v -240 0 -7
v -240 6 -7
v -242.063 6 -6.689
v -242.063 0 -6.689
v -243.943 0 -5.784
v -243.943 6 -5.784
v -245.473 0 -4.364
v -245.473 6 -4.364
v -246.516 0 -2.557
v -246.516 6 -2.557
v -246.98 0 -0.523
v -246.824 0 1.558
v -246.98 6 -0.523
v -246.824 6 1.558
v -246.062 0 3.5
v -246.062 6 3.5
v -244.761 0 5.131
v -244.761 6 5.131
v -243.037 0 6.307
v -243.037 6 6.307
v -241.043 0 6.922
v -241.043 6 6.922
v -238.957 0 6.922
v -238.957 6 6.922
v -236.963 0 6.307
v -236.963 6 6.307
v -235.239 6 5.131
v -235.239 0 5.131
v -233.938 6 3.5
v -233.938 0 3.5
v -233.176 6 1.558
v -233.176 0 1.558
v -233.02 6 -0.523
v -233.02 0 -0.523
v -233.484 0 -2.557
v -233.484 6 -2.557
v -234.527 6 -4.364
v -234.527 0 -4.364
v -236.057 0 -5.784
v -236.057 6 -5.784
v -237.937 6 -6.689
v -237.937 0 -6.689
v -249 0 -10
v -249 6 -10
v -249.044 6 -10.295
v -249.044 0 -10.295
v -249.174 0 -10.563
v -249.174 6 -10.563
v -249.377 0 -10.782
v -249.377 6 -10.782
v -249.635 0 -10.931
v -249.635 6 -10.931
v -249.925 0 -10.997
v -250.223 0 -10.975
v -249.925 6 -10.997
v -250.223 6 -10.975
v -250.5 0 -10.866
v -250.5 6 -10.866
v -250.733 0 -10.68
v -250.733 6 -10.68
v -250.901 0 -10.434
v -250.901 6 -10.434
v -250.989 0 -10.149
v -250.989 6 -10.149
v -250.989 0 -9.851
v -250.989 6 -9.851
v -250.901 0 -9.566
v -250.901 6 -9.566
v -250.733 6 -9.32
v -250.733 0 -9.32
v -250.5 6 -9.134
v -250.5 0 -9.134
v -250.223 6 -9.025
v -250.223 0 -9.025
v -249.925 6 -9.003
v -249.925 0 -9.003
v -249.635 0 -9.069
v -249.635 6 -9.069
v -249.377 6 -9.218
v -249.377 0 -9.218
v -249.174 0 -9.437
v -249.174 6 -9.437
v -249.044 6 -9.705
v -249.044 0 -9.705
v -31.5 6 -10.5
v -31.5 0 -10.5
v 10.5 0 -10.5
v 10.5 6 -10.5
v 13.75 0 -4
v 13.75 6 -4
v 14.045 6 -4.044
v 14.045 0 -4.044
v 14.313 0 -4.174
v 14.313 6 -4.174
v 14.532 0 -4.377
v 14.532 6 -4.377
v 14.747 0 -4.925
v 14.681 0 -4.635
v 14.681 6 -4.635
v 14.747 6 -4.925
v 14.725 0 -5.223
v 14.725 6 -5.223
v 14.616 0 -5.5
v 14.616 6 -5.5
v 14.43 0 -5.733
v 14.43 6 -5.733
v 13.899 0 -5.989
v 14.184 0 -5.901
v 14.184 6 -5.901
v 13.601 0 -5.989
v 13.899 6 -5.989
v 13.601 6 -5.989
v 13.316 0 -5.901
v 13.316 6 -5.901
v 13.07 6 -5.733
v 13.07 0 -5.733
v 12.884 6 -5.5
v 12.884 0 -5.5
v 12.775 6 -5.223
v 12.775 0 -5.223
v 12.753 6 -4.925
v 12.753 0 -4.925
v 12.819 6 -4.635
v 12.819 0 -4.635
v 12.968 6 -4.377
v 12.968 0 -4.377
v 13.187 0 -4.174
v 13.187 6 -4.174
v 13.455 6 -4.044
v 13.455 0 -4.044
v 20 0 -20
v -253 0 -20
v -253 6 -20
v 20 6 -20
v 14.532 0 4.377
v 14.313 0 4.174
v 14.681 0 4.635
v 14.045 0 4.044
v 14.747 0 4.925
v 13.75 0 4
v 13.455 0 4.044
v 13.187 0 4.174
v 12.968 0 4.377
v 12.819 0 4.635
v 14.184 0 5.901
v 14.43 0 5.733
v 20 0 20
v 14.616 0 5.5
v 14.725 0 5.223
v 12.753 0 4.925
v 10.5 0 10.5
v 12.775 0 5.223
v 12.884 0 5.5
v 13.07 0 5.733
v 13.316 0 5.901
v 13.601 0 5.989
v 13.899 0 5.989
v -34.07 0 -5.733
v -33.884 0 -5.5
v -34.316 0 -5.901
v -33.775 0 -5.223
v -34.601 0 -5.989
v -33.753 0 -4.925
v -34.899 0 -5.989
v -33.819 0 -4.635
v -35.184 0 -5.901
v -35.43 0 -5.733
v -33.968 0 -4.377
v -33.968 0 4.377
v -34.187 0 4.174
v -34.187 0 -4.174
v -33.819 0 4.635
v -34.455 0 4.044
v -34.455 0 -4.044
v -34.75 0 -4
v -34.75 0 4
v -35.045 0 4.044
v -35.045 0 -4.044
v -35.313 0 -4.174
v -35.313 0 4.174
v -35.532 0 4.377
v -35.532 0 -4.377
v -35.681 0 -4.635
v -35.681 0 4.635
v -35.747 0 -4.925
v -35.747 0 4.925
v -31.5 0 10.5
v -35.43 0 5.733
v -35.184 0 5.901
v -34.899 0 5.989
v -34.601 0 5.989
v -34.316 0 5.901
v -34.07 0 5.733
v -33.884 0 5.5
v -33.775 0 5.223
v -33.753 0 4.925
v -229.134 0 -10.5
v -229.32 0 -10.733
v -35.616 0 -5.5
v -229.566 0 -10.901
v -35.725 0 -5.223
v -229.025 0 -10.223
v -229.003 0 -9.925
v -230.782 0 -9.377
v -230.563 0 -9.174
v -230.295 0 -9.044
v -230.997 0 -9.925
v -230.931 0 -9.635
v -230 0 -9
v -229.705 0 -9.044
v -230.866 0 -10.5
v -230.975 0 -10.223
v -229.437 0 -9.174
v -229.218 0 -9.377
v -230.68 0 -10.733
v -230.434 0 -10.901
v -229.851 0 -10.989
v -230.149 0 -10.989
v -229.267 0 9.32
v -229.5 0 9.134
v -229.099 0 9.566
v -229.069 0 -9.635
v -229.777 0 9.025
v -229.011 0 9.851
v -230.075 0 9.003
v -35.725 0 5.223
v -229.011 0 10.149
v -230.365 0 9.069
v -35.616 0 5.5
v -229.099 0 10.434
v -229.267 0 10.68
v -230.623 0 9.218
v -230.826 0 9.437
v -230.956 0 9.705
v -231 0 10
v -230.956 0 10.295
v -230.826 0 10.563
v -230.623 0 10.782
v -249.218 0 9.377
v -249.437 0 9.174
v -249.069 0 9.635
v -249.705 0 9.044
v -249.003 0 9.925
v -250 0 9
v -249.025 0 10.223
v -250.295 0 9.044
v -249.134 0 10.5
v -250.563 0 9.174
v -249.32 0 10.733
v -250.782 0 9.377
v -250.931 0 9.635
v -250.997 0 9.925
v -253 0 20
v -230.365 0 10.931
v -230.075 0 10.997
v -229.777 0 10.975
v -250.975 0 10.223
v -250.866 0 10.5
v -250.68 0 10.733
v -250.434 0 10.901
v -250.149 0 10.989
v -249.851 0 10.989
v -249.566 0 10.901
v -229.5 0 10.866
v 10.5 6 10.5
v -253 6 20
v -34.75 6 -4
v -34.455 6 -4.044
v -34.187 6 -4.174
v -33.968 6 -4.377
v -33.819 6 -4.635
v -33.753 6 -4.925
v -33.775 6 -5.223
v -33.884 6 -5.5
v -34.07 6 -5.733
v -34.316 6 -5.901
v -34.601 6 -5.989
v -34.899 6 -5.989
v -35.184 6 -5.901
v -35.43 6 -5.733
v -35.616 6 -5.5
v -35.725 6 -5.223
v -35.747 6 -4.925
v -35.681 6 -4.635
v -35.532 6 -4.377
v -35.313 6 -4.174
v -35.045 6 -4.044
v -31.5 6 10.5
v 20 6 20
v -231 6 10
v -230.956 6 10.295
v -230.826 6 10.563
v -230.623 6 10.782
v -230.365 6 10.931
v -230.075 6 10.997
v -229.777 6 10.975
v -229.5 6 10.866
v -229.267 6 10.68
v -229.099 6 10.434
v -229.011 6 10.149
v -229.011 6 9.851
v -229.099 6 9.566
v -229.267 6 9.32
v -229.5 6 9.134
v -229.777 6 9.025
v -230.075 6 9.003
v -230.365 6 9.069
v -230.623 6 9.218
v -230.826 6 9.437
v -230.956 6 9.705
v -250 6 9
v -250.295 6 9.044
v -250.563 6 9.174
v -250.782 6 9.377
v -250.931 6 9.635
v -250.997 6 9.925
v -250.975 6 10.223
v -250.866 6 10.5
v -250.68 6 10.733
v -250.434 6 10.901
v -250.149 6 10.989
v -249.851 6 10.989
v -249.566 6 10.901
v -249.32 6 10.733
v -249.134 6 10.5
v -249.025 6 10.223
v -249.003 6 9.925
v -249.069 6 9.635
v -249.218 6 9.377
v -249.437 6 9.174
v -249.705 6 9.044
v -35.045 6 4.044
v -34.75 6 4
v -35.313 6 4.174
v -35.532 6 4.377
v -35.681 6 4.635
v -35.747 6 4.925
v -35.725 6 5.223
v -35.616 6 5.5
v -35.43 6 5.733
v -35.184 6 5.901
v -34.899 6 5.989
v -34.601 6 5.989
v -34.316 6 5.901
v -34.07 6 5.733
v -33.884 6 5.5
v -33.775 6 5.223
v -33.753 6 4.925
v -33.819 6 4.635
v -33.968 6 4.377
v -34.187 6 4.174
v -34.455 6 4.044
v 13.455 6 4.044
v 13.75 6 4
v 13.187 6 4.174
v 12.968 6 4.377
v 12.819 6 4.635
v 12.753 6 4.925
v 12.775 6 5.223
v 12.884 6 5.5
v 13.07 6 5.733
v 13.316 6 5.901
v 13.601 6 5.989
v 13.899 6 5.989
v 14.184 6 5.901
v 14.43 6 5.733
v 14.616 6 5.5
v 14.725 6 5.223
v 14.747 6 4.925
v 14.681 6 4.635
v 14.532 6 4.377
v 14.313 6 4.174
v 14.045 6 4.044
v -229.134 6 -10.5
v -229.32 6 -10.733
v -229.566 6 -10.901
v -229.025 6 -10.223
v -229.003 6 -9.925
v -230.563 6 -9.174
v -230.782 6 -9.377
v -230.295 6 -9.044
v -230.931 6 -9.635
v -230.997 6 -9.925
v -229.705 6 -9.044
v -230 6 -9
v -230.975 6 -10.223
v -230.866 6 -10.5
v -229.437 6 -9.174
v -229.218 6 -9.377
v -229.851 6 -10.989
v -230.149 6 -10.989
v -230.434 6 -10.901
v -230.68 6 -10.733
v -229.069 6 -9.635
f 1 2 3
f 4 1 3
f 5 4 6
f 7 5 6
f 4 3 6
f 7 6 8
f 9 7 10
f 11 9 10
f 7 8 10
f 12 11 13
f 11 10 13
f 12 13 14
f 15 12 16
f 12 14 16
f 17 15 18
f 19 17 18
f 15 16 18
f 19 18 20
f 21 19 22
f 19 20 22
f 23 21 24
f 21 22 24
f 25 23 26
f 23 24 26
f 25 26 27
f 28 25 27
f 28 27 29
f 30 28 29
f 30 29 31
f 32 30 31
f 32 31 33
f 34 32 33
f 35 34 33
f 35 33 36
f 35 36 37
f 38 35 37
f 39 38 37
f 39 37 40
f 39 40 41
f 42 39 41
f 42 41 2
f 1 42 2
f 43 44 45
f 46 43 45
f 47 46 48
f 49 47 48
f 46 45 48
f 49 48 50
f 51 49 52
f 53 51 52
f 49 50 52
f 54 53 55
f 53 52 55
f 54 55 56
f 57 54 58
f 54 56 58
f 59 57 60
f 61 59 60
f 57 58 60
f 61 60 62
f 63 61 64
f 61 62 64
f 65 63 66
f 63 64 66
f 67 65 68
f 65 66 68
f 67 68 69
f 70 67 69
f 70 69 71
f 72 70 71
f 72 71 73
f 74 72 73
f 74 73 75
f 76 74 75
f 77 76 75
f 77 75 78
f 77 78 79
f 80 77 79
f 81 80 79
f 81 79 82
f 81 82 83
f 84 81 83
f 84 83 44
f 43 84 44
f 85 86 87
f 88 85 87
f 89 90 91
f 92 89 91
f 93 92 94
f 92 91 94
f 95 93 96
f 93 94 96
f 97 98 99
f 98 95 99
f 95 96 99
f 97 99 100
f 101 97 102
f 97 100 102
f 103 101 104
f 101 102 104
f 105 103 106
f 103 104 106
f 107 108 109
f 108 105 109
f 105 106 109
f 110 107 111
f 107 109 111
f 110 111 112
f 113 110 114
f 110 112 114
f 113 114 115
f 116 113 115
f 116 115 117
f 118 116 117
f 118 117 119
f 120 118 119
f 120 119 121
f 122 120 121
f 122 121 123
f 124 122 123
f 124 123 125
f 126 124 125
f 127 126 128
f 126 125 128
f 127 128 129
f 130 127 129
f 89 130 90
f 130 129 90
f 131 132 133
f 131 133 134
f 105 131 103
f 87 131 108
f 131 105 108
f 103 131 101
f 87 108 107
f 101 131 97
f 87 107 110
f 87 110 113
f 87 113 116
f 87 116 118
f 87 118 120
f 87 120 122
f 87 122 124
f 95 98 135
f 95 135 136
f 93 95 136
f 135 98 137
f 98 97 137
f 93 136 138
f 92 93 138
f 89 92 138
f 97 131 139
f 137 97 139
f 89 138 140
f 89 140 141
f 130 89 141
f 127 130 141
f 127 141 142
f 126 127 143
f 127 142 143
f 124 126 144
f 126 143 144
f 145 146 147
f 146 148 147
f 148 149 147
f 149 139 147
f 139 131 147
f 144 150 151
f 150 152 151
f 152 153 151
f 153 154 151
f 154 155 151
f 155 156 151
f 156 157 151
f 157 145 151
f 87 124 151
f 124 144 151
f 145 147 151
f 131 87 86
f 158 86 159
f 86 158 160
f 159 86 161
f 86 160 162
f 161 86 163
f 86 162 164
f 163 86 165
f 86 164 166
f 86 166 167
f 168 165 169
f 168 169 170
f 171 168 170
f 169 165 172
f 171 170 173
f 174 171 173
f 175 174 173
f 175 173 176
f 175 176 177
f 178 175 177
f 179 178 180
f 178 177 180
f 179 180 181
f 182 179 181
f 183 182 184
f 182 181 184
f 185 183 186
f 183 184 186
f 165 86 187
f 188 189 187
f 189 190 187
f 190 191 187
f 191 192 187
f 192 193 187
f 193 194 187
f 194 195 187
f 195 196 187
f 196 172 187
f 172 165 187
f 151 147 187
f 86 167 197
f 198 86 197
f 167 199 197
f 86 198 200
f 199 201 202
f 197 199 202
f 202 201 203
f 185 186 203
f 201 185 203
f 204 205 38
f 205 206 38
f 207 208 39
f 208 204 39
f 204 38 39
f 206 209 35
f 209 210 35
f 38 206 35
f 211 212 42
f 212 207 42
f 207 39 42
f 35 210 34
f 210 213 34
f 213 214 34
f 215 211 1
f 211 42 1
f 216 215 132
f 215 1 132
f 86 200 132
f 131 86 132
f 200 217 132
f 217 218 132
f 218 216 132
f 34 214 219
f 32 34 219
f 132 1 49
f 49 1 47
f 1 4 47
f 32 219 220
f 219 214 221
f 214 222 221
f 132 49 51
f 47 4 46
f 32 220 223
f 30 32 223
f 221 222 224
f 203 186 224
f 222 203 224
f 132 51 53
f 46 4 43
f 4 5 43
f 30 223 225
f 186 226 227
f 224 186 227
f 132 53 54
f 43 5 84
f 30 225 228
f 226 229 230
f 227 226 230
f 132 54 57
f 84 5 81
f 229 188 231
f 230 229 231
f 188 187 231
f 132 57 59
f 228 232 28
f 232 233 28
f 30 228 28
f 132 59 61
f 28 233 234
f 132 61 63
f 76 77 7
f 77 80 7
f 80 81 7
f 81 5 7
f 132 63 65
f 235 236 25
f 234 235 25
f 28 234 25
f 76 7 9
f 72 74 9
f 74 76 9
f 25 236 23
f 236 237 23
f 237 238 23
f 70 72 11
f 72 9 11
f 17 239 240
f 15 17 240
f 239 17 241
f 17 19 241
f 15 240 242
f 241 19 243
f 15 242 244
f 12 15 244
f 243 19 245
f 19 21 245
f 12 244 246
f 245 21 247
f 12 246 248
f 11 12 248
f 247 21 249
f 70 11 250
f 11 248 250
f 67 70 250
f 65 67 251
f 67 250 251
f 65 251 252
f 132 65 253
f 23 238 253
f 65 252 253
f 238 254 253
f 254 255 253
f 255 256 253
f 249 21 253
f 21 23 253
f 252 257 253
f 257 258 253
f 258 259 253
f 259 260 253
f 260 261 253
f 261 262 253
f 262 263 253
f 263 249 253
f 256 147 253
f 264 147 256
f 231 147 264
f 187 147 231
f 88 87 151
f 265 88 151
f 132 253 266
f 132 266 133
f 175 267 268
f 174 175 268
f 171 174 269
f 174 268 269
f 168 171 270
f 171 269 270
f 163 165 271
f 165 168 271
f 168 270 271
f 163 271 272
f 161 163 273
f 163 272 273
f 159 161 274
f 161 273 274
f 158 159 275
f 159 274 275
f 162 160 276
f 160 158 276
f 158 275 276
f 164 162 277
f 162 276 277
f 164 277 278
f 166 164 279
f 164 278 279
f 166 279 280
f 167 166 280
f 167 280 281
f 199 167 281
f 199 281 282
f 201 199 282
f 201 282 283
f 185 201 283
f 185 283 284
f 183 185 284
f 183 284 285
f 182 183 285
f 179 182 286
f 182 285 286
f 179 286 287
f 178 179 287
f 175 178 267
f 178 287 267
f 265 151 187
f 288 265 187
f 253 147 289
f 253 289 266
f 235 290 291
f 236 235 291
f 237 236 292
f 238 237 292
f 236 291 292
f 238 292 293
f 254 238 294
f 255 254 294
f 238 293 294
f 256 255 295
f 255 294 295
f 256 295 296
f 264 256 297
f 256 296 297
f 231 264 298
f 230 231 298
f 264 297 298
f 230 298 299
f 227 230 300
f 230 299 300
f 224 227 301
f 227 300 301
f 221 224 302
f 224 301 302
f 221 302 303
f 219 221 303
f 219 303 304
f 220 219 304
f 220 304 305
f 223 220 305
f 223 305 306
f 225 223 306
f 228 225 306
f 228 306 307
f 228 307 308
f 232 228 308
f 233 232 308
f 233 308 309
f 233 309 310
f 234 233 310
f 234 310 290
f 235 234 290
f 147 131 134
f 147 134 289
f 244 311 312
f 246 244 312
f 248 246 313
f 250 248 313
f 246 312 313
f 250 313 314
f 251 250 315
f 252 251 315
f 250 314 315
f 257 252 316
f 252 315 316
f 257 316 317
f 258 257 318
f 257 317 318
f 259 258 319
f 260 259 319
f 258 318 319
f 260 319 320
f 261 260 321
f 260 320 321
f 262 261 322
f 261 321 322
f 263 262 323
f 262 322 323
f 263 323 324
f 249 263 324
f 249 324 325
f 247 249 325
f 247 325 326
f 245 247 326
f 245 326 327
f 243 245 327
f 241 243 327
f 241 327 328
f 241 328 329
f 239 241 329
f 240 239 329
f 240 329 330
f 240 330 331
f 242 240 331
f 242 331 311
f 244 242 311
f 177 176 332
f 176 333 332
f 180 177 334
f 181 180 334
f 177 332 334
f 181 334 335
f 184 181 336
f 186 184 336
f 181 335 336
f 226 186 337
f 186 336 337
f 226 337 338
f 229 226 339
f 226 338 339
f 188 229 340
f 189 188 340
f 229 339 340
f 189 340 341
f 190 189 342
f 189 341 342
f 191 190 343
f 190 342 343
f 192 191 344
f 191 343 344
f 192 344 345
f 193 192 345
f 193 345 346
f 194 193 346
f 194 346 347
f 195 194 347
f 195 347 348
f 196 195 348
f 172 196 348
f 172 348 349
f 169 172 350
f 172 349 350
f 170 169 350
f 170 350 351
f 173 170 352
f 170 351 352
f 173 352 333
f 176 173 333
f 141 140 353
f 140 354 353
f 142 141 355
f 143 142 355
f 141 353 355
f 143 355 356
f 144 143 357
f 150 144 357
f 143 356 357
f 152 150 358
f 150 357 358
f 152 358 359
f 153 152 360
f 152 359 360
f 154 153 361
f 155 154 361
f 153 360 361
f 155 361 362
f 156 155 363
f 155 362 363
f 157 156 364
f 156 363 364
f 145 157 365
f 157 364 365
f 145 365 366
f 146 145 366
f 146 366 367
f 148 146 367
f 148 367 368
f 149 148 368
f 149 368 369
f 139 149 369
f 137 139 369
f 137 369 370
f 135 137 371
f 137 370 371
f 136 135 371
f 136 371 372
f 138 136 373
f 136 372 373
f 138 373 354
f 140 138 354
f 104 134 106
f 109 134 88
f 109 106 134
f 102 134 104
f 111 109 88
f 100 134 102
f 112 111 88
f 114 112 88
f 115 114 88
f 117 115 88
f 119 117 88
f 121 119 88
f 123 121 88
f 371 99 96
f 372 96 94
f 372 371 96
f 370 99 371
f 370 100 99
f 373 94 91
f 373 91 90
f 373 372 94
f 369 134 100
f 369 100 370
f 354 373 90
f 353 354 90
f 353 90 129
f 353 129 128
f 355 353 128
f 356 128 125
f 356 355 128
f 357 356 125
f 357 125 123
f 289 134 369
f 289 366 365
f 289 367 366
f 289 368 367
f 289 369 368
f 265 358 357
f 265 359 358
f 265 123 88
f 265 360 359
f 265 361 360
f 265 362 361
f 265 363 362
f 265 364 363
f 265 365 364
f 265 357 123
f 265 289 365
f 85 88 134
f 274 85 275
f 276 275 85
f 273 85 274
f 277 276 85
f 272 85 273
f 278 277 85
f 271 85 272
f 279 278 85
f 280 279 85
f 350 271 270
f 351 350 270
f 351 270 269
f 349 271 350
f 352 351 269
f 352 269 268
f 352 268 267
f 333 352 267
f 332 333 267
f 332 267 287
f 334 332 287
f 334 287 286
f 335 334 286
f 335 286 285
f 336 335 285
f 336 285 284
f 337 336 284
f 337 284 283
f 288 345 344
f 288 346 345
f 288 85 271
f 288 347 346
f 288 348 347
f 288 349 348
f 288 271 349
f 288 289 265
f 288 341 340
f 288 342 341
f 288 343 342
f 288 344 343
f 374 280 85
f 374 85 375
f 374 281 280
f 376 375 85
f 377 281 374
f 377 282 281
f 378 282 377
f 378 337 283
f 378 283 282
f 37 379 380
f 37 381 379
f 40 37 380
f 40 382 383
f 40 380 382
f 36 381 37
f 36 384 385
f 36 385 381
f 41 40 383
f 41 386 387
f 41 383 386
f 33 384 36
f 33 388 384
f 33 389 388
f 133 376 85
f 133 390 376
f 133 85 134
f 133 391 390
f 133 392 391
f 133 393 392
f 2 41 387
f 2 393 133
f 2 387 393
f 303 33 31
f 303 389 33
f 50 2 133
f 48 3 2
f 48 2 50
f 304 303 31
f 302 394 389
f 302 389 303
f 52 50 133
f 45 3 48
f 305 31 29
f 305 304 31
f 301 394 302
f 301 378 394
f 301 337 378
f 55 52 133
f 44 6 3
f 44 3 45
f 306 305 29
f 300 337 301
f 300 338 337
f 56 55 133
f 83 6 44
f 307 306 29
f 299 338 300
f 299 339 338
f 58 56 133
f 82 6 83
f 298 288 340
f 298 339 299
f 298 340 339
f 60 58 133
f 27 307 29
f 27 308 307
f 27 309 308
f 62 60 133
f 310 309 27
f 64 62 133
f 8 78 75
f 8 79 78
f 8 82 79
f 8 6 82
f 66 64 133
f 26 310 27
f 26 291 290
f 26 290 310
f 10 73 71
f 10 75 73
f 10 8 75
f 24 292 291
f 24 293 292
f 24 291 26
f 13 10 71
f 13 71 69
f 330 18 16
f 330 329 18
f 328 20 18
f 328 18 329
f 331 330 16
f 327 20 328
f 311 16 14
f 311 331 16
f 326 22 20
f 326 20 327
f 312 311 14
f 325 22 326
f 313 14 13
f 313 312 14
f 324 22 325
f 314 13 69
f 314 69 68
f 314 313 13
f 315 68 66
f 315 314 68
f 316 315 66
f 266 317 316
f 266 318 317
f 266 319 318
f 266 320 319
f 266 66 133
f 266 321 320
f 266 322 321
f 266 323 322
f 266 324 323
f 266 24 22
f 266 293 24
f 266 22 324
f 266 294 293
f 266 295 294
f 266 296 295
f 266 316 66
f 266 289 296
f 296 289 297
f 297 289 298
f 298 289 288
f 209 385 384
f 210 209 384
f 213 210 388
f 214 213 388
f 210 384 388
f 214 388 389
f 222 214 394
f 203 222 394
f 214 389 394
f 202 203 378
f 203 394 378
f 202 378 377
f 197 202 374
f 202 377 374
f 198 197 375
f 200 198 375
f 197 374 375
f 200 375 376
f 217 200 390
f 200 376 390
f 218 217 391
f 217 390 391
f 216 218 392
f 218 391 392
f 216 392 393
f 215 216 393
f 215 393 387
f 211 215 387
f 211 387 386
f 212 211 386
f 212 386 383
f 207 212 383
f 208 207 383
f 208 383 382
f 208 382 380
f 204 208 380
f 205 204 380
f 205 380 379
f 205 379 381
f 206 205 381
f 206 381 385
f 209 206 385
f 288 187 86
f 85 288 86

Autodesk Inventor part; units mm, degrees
ref_plane "YZ Plane" through (0, 0, 0) normal (1, 0, 0) x (0, 1, 0)
ref_plane "XZ Plane" through (0, 0, 0) normal (0, 1, 0) x (-1, 0, 0)
ref_plane "XY Plane" through (0, 0, 0) normal (0, 0, 1) x (1, 0, 0)
sketch "Sketch1" plane through (0, 0, 0) normal (0, 1, 0) x (-1, 0, 0)
  line L0 (0, 0) -> (31.5, 0)
  line L1 (0, 0) -> (18.5, 0) construction
  line L2 (0, 0) -> (-10.5, 0)
  line L3 (-20, 0) -> (-20, 20)
  line L4 (-20, 20) -> (253, 20)
  line L5 (253, 20) -> (253, 0)
  line L6 (-10.5, 10.5) -> (31.5, 10.5)
  line L7 (31.5, 10.5) -> (31.5, -10.5)
  line L8 (31.5, -10.5) -> (-10.5, -10.5)
  line L9 (-10.5, -10.5) -> (-10.5, 10.5)
  line L10 (-10.5, 10.5) -> (31.5, -10.5) construction
  line L11 (31.5, 10.5) -> (-10.5, -10.5) construction
  line L12 (-13.75, 5) -> (34.75, 5) construction
  line L13 (34.75, 5) -> (34.75, -5) construction
  line L14 (34.75, -5) -> (-13.75, -5) construction
  line L15 (-13.75, -5) -> (-13.75, 5) construction
  line L16 (-13.75, 5) -> (34.75, -5) construction
  line L17 (34.75, 5) -> (-13.75, -5) construction
  line L18 (31.5, 0) -> (253, 0)
  line L19 (-10.5, 0) -> (-20, 0)
  line L20 (-20, 0) -> (0, 0) construction
  line L21 (240, 0) -> (240, 10) construction
  line L22 (240, 10) -> (250, 10) construction
  point P0 (10.5, 0)
  point P1 (10.5, 0)
  dimension "d28" = 18.5
  dimension "d37" = 20
  dimension "d38" = 20
  dimension "d39" = 42
  dimension "d40" = 21
  dimension "d41" = 48.5
  dimension "d42" = 10
  dimension "d43" = 10.5
  dimension "d52" = 240
  dimension "d53" = 13
  dimension "d54" = 9.5
  dimension "d62" = 10
extrude "Extrusion1" add sketch "Sketch1" along normal blind 6 contours L7 L6 L9 L19 L3 L4 L5 L18
hole "Hole3" at (0, 0, 0) at (13.75, 0, 5) at (-34.75, 0, 5) direction (0, 1, 0) diameter 2 end through all
fillet "Fillet1" [suppressed]
mirror "Mirror1" about plane through (-31.5, 0, 0) normal (0, 0, -1)
hole "Hole4" at (-240, 0, 0) direction (0, 1, 0) diameter 14 end through all
hole "Hole5" at (-250, 0, 10) direction (0, 1, 0) diameter 2 end through all
pattern_circular "Circular Pattern1" count 4 over 360 about axis through (-240, 275.9801, 0) along (0, 1, 0) of "Hole5"
properties part number "segment2b" material "Plywood, Finish"
